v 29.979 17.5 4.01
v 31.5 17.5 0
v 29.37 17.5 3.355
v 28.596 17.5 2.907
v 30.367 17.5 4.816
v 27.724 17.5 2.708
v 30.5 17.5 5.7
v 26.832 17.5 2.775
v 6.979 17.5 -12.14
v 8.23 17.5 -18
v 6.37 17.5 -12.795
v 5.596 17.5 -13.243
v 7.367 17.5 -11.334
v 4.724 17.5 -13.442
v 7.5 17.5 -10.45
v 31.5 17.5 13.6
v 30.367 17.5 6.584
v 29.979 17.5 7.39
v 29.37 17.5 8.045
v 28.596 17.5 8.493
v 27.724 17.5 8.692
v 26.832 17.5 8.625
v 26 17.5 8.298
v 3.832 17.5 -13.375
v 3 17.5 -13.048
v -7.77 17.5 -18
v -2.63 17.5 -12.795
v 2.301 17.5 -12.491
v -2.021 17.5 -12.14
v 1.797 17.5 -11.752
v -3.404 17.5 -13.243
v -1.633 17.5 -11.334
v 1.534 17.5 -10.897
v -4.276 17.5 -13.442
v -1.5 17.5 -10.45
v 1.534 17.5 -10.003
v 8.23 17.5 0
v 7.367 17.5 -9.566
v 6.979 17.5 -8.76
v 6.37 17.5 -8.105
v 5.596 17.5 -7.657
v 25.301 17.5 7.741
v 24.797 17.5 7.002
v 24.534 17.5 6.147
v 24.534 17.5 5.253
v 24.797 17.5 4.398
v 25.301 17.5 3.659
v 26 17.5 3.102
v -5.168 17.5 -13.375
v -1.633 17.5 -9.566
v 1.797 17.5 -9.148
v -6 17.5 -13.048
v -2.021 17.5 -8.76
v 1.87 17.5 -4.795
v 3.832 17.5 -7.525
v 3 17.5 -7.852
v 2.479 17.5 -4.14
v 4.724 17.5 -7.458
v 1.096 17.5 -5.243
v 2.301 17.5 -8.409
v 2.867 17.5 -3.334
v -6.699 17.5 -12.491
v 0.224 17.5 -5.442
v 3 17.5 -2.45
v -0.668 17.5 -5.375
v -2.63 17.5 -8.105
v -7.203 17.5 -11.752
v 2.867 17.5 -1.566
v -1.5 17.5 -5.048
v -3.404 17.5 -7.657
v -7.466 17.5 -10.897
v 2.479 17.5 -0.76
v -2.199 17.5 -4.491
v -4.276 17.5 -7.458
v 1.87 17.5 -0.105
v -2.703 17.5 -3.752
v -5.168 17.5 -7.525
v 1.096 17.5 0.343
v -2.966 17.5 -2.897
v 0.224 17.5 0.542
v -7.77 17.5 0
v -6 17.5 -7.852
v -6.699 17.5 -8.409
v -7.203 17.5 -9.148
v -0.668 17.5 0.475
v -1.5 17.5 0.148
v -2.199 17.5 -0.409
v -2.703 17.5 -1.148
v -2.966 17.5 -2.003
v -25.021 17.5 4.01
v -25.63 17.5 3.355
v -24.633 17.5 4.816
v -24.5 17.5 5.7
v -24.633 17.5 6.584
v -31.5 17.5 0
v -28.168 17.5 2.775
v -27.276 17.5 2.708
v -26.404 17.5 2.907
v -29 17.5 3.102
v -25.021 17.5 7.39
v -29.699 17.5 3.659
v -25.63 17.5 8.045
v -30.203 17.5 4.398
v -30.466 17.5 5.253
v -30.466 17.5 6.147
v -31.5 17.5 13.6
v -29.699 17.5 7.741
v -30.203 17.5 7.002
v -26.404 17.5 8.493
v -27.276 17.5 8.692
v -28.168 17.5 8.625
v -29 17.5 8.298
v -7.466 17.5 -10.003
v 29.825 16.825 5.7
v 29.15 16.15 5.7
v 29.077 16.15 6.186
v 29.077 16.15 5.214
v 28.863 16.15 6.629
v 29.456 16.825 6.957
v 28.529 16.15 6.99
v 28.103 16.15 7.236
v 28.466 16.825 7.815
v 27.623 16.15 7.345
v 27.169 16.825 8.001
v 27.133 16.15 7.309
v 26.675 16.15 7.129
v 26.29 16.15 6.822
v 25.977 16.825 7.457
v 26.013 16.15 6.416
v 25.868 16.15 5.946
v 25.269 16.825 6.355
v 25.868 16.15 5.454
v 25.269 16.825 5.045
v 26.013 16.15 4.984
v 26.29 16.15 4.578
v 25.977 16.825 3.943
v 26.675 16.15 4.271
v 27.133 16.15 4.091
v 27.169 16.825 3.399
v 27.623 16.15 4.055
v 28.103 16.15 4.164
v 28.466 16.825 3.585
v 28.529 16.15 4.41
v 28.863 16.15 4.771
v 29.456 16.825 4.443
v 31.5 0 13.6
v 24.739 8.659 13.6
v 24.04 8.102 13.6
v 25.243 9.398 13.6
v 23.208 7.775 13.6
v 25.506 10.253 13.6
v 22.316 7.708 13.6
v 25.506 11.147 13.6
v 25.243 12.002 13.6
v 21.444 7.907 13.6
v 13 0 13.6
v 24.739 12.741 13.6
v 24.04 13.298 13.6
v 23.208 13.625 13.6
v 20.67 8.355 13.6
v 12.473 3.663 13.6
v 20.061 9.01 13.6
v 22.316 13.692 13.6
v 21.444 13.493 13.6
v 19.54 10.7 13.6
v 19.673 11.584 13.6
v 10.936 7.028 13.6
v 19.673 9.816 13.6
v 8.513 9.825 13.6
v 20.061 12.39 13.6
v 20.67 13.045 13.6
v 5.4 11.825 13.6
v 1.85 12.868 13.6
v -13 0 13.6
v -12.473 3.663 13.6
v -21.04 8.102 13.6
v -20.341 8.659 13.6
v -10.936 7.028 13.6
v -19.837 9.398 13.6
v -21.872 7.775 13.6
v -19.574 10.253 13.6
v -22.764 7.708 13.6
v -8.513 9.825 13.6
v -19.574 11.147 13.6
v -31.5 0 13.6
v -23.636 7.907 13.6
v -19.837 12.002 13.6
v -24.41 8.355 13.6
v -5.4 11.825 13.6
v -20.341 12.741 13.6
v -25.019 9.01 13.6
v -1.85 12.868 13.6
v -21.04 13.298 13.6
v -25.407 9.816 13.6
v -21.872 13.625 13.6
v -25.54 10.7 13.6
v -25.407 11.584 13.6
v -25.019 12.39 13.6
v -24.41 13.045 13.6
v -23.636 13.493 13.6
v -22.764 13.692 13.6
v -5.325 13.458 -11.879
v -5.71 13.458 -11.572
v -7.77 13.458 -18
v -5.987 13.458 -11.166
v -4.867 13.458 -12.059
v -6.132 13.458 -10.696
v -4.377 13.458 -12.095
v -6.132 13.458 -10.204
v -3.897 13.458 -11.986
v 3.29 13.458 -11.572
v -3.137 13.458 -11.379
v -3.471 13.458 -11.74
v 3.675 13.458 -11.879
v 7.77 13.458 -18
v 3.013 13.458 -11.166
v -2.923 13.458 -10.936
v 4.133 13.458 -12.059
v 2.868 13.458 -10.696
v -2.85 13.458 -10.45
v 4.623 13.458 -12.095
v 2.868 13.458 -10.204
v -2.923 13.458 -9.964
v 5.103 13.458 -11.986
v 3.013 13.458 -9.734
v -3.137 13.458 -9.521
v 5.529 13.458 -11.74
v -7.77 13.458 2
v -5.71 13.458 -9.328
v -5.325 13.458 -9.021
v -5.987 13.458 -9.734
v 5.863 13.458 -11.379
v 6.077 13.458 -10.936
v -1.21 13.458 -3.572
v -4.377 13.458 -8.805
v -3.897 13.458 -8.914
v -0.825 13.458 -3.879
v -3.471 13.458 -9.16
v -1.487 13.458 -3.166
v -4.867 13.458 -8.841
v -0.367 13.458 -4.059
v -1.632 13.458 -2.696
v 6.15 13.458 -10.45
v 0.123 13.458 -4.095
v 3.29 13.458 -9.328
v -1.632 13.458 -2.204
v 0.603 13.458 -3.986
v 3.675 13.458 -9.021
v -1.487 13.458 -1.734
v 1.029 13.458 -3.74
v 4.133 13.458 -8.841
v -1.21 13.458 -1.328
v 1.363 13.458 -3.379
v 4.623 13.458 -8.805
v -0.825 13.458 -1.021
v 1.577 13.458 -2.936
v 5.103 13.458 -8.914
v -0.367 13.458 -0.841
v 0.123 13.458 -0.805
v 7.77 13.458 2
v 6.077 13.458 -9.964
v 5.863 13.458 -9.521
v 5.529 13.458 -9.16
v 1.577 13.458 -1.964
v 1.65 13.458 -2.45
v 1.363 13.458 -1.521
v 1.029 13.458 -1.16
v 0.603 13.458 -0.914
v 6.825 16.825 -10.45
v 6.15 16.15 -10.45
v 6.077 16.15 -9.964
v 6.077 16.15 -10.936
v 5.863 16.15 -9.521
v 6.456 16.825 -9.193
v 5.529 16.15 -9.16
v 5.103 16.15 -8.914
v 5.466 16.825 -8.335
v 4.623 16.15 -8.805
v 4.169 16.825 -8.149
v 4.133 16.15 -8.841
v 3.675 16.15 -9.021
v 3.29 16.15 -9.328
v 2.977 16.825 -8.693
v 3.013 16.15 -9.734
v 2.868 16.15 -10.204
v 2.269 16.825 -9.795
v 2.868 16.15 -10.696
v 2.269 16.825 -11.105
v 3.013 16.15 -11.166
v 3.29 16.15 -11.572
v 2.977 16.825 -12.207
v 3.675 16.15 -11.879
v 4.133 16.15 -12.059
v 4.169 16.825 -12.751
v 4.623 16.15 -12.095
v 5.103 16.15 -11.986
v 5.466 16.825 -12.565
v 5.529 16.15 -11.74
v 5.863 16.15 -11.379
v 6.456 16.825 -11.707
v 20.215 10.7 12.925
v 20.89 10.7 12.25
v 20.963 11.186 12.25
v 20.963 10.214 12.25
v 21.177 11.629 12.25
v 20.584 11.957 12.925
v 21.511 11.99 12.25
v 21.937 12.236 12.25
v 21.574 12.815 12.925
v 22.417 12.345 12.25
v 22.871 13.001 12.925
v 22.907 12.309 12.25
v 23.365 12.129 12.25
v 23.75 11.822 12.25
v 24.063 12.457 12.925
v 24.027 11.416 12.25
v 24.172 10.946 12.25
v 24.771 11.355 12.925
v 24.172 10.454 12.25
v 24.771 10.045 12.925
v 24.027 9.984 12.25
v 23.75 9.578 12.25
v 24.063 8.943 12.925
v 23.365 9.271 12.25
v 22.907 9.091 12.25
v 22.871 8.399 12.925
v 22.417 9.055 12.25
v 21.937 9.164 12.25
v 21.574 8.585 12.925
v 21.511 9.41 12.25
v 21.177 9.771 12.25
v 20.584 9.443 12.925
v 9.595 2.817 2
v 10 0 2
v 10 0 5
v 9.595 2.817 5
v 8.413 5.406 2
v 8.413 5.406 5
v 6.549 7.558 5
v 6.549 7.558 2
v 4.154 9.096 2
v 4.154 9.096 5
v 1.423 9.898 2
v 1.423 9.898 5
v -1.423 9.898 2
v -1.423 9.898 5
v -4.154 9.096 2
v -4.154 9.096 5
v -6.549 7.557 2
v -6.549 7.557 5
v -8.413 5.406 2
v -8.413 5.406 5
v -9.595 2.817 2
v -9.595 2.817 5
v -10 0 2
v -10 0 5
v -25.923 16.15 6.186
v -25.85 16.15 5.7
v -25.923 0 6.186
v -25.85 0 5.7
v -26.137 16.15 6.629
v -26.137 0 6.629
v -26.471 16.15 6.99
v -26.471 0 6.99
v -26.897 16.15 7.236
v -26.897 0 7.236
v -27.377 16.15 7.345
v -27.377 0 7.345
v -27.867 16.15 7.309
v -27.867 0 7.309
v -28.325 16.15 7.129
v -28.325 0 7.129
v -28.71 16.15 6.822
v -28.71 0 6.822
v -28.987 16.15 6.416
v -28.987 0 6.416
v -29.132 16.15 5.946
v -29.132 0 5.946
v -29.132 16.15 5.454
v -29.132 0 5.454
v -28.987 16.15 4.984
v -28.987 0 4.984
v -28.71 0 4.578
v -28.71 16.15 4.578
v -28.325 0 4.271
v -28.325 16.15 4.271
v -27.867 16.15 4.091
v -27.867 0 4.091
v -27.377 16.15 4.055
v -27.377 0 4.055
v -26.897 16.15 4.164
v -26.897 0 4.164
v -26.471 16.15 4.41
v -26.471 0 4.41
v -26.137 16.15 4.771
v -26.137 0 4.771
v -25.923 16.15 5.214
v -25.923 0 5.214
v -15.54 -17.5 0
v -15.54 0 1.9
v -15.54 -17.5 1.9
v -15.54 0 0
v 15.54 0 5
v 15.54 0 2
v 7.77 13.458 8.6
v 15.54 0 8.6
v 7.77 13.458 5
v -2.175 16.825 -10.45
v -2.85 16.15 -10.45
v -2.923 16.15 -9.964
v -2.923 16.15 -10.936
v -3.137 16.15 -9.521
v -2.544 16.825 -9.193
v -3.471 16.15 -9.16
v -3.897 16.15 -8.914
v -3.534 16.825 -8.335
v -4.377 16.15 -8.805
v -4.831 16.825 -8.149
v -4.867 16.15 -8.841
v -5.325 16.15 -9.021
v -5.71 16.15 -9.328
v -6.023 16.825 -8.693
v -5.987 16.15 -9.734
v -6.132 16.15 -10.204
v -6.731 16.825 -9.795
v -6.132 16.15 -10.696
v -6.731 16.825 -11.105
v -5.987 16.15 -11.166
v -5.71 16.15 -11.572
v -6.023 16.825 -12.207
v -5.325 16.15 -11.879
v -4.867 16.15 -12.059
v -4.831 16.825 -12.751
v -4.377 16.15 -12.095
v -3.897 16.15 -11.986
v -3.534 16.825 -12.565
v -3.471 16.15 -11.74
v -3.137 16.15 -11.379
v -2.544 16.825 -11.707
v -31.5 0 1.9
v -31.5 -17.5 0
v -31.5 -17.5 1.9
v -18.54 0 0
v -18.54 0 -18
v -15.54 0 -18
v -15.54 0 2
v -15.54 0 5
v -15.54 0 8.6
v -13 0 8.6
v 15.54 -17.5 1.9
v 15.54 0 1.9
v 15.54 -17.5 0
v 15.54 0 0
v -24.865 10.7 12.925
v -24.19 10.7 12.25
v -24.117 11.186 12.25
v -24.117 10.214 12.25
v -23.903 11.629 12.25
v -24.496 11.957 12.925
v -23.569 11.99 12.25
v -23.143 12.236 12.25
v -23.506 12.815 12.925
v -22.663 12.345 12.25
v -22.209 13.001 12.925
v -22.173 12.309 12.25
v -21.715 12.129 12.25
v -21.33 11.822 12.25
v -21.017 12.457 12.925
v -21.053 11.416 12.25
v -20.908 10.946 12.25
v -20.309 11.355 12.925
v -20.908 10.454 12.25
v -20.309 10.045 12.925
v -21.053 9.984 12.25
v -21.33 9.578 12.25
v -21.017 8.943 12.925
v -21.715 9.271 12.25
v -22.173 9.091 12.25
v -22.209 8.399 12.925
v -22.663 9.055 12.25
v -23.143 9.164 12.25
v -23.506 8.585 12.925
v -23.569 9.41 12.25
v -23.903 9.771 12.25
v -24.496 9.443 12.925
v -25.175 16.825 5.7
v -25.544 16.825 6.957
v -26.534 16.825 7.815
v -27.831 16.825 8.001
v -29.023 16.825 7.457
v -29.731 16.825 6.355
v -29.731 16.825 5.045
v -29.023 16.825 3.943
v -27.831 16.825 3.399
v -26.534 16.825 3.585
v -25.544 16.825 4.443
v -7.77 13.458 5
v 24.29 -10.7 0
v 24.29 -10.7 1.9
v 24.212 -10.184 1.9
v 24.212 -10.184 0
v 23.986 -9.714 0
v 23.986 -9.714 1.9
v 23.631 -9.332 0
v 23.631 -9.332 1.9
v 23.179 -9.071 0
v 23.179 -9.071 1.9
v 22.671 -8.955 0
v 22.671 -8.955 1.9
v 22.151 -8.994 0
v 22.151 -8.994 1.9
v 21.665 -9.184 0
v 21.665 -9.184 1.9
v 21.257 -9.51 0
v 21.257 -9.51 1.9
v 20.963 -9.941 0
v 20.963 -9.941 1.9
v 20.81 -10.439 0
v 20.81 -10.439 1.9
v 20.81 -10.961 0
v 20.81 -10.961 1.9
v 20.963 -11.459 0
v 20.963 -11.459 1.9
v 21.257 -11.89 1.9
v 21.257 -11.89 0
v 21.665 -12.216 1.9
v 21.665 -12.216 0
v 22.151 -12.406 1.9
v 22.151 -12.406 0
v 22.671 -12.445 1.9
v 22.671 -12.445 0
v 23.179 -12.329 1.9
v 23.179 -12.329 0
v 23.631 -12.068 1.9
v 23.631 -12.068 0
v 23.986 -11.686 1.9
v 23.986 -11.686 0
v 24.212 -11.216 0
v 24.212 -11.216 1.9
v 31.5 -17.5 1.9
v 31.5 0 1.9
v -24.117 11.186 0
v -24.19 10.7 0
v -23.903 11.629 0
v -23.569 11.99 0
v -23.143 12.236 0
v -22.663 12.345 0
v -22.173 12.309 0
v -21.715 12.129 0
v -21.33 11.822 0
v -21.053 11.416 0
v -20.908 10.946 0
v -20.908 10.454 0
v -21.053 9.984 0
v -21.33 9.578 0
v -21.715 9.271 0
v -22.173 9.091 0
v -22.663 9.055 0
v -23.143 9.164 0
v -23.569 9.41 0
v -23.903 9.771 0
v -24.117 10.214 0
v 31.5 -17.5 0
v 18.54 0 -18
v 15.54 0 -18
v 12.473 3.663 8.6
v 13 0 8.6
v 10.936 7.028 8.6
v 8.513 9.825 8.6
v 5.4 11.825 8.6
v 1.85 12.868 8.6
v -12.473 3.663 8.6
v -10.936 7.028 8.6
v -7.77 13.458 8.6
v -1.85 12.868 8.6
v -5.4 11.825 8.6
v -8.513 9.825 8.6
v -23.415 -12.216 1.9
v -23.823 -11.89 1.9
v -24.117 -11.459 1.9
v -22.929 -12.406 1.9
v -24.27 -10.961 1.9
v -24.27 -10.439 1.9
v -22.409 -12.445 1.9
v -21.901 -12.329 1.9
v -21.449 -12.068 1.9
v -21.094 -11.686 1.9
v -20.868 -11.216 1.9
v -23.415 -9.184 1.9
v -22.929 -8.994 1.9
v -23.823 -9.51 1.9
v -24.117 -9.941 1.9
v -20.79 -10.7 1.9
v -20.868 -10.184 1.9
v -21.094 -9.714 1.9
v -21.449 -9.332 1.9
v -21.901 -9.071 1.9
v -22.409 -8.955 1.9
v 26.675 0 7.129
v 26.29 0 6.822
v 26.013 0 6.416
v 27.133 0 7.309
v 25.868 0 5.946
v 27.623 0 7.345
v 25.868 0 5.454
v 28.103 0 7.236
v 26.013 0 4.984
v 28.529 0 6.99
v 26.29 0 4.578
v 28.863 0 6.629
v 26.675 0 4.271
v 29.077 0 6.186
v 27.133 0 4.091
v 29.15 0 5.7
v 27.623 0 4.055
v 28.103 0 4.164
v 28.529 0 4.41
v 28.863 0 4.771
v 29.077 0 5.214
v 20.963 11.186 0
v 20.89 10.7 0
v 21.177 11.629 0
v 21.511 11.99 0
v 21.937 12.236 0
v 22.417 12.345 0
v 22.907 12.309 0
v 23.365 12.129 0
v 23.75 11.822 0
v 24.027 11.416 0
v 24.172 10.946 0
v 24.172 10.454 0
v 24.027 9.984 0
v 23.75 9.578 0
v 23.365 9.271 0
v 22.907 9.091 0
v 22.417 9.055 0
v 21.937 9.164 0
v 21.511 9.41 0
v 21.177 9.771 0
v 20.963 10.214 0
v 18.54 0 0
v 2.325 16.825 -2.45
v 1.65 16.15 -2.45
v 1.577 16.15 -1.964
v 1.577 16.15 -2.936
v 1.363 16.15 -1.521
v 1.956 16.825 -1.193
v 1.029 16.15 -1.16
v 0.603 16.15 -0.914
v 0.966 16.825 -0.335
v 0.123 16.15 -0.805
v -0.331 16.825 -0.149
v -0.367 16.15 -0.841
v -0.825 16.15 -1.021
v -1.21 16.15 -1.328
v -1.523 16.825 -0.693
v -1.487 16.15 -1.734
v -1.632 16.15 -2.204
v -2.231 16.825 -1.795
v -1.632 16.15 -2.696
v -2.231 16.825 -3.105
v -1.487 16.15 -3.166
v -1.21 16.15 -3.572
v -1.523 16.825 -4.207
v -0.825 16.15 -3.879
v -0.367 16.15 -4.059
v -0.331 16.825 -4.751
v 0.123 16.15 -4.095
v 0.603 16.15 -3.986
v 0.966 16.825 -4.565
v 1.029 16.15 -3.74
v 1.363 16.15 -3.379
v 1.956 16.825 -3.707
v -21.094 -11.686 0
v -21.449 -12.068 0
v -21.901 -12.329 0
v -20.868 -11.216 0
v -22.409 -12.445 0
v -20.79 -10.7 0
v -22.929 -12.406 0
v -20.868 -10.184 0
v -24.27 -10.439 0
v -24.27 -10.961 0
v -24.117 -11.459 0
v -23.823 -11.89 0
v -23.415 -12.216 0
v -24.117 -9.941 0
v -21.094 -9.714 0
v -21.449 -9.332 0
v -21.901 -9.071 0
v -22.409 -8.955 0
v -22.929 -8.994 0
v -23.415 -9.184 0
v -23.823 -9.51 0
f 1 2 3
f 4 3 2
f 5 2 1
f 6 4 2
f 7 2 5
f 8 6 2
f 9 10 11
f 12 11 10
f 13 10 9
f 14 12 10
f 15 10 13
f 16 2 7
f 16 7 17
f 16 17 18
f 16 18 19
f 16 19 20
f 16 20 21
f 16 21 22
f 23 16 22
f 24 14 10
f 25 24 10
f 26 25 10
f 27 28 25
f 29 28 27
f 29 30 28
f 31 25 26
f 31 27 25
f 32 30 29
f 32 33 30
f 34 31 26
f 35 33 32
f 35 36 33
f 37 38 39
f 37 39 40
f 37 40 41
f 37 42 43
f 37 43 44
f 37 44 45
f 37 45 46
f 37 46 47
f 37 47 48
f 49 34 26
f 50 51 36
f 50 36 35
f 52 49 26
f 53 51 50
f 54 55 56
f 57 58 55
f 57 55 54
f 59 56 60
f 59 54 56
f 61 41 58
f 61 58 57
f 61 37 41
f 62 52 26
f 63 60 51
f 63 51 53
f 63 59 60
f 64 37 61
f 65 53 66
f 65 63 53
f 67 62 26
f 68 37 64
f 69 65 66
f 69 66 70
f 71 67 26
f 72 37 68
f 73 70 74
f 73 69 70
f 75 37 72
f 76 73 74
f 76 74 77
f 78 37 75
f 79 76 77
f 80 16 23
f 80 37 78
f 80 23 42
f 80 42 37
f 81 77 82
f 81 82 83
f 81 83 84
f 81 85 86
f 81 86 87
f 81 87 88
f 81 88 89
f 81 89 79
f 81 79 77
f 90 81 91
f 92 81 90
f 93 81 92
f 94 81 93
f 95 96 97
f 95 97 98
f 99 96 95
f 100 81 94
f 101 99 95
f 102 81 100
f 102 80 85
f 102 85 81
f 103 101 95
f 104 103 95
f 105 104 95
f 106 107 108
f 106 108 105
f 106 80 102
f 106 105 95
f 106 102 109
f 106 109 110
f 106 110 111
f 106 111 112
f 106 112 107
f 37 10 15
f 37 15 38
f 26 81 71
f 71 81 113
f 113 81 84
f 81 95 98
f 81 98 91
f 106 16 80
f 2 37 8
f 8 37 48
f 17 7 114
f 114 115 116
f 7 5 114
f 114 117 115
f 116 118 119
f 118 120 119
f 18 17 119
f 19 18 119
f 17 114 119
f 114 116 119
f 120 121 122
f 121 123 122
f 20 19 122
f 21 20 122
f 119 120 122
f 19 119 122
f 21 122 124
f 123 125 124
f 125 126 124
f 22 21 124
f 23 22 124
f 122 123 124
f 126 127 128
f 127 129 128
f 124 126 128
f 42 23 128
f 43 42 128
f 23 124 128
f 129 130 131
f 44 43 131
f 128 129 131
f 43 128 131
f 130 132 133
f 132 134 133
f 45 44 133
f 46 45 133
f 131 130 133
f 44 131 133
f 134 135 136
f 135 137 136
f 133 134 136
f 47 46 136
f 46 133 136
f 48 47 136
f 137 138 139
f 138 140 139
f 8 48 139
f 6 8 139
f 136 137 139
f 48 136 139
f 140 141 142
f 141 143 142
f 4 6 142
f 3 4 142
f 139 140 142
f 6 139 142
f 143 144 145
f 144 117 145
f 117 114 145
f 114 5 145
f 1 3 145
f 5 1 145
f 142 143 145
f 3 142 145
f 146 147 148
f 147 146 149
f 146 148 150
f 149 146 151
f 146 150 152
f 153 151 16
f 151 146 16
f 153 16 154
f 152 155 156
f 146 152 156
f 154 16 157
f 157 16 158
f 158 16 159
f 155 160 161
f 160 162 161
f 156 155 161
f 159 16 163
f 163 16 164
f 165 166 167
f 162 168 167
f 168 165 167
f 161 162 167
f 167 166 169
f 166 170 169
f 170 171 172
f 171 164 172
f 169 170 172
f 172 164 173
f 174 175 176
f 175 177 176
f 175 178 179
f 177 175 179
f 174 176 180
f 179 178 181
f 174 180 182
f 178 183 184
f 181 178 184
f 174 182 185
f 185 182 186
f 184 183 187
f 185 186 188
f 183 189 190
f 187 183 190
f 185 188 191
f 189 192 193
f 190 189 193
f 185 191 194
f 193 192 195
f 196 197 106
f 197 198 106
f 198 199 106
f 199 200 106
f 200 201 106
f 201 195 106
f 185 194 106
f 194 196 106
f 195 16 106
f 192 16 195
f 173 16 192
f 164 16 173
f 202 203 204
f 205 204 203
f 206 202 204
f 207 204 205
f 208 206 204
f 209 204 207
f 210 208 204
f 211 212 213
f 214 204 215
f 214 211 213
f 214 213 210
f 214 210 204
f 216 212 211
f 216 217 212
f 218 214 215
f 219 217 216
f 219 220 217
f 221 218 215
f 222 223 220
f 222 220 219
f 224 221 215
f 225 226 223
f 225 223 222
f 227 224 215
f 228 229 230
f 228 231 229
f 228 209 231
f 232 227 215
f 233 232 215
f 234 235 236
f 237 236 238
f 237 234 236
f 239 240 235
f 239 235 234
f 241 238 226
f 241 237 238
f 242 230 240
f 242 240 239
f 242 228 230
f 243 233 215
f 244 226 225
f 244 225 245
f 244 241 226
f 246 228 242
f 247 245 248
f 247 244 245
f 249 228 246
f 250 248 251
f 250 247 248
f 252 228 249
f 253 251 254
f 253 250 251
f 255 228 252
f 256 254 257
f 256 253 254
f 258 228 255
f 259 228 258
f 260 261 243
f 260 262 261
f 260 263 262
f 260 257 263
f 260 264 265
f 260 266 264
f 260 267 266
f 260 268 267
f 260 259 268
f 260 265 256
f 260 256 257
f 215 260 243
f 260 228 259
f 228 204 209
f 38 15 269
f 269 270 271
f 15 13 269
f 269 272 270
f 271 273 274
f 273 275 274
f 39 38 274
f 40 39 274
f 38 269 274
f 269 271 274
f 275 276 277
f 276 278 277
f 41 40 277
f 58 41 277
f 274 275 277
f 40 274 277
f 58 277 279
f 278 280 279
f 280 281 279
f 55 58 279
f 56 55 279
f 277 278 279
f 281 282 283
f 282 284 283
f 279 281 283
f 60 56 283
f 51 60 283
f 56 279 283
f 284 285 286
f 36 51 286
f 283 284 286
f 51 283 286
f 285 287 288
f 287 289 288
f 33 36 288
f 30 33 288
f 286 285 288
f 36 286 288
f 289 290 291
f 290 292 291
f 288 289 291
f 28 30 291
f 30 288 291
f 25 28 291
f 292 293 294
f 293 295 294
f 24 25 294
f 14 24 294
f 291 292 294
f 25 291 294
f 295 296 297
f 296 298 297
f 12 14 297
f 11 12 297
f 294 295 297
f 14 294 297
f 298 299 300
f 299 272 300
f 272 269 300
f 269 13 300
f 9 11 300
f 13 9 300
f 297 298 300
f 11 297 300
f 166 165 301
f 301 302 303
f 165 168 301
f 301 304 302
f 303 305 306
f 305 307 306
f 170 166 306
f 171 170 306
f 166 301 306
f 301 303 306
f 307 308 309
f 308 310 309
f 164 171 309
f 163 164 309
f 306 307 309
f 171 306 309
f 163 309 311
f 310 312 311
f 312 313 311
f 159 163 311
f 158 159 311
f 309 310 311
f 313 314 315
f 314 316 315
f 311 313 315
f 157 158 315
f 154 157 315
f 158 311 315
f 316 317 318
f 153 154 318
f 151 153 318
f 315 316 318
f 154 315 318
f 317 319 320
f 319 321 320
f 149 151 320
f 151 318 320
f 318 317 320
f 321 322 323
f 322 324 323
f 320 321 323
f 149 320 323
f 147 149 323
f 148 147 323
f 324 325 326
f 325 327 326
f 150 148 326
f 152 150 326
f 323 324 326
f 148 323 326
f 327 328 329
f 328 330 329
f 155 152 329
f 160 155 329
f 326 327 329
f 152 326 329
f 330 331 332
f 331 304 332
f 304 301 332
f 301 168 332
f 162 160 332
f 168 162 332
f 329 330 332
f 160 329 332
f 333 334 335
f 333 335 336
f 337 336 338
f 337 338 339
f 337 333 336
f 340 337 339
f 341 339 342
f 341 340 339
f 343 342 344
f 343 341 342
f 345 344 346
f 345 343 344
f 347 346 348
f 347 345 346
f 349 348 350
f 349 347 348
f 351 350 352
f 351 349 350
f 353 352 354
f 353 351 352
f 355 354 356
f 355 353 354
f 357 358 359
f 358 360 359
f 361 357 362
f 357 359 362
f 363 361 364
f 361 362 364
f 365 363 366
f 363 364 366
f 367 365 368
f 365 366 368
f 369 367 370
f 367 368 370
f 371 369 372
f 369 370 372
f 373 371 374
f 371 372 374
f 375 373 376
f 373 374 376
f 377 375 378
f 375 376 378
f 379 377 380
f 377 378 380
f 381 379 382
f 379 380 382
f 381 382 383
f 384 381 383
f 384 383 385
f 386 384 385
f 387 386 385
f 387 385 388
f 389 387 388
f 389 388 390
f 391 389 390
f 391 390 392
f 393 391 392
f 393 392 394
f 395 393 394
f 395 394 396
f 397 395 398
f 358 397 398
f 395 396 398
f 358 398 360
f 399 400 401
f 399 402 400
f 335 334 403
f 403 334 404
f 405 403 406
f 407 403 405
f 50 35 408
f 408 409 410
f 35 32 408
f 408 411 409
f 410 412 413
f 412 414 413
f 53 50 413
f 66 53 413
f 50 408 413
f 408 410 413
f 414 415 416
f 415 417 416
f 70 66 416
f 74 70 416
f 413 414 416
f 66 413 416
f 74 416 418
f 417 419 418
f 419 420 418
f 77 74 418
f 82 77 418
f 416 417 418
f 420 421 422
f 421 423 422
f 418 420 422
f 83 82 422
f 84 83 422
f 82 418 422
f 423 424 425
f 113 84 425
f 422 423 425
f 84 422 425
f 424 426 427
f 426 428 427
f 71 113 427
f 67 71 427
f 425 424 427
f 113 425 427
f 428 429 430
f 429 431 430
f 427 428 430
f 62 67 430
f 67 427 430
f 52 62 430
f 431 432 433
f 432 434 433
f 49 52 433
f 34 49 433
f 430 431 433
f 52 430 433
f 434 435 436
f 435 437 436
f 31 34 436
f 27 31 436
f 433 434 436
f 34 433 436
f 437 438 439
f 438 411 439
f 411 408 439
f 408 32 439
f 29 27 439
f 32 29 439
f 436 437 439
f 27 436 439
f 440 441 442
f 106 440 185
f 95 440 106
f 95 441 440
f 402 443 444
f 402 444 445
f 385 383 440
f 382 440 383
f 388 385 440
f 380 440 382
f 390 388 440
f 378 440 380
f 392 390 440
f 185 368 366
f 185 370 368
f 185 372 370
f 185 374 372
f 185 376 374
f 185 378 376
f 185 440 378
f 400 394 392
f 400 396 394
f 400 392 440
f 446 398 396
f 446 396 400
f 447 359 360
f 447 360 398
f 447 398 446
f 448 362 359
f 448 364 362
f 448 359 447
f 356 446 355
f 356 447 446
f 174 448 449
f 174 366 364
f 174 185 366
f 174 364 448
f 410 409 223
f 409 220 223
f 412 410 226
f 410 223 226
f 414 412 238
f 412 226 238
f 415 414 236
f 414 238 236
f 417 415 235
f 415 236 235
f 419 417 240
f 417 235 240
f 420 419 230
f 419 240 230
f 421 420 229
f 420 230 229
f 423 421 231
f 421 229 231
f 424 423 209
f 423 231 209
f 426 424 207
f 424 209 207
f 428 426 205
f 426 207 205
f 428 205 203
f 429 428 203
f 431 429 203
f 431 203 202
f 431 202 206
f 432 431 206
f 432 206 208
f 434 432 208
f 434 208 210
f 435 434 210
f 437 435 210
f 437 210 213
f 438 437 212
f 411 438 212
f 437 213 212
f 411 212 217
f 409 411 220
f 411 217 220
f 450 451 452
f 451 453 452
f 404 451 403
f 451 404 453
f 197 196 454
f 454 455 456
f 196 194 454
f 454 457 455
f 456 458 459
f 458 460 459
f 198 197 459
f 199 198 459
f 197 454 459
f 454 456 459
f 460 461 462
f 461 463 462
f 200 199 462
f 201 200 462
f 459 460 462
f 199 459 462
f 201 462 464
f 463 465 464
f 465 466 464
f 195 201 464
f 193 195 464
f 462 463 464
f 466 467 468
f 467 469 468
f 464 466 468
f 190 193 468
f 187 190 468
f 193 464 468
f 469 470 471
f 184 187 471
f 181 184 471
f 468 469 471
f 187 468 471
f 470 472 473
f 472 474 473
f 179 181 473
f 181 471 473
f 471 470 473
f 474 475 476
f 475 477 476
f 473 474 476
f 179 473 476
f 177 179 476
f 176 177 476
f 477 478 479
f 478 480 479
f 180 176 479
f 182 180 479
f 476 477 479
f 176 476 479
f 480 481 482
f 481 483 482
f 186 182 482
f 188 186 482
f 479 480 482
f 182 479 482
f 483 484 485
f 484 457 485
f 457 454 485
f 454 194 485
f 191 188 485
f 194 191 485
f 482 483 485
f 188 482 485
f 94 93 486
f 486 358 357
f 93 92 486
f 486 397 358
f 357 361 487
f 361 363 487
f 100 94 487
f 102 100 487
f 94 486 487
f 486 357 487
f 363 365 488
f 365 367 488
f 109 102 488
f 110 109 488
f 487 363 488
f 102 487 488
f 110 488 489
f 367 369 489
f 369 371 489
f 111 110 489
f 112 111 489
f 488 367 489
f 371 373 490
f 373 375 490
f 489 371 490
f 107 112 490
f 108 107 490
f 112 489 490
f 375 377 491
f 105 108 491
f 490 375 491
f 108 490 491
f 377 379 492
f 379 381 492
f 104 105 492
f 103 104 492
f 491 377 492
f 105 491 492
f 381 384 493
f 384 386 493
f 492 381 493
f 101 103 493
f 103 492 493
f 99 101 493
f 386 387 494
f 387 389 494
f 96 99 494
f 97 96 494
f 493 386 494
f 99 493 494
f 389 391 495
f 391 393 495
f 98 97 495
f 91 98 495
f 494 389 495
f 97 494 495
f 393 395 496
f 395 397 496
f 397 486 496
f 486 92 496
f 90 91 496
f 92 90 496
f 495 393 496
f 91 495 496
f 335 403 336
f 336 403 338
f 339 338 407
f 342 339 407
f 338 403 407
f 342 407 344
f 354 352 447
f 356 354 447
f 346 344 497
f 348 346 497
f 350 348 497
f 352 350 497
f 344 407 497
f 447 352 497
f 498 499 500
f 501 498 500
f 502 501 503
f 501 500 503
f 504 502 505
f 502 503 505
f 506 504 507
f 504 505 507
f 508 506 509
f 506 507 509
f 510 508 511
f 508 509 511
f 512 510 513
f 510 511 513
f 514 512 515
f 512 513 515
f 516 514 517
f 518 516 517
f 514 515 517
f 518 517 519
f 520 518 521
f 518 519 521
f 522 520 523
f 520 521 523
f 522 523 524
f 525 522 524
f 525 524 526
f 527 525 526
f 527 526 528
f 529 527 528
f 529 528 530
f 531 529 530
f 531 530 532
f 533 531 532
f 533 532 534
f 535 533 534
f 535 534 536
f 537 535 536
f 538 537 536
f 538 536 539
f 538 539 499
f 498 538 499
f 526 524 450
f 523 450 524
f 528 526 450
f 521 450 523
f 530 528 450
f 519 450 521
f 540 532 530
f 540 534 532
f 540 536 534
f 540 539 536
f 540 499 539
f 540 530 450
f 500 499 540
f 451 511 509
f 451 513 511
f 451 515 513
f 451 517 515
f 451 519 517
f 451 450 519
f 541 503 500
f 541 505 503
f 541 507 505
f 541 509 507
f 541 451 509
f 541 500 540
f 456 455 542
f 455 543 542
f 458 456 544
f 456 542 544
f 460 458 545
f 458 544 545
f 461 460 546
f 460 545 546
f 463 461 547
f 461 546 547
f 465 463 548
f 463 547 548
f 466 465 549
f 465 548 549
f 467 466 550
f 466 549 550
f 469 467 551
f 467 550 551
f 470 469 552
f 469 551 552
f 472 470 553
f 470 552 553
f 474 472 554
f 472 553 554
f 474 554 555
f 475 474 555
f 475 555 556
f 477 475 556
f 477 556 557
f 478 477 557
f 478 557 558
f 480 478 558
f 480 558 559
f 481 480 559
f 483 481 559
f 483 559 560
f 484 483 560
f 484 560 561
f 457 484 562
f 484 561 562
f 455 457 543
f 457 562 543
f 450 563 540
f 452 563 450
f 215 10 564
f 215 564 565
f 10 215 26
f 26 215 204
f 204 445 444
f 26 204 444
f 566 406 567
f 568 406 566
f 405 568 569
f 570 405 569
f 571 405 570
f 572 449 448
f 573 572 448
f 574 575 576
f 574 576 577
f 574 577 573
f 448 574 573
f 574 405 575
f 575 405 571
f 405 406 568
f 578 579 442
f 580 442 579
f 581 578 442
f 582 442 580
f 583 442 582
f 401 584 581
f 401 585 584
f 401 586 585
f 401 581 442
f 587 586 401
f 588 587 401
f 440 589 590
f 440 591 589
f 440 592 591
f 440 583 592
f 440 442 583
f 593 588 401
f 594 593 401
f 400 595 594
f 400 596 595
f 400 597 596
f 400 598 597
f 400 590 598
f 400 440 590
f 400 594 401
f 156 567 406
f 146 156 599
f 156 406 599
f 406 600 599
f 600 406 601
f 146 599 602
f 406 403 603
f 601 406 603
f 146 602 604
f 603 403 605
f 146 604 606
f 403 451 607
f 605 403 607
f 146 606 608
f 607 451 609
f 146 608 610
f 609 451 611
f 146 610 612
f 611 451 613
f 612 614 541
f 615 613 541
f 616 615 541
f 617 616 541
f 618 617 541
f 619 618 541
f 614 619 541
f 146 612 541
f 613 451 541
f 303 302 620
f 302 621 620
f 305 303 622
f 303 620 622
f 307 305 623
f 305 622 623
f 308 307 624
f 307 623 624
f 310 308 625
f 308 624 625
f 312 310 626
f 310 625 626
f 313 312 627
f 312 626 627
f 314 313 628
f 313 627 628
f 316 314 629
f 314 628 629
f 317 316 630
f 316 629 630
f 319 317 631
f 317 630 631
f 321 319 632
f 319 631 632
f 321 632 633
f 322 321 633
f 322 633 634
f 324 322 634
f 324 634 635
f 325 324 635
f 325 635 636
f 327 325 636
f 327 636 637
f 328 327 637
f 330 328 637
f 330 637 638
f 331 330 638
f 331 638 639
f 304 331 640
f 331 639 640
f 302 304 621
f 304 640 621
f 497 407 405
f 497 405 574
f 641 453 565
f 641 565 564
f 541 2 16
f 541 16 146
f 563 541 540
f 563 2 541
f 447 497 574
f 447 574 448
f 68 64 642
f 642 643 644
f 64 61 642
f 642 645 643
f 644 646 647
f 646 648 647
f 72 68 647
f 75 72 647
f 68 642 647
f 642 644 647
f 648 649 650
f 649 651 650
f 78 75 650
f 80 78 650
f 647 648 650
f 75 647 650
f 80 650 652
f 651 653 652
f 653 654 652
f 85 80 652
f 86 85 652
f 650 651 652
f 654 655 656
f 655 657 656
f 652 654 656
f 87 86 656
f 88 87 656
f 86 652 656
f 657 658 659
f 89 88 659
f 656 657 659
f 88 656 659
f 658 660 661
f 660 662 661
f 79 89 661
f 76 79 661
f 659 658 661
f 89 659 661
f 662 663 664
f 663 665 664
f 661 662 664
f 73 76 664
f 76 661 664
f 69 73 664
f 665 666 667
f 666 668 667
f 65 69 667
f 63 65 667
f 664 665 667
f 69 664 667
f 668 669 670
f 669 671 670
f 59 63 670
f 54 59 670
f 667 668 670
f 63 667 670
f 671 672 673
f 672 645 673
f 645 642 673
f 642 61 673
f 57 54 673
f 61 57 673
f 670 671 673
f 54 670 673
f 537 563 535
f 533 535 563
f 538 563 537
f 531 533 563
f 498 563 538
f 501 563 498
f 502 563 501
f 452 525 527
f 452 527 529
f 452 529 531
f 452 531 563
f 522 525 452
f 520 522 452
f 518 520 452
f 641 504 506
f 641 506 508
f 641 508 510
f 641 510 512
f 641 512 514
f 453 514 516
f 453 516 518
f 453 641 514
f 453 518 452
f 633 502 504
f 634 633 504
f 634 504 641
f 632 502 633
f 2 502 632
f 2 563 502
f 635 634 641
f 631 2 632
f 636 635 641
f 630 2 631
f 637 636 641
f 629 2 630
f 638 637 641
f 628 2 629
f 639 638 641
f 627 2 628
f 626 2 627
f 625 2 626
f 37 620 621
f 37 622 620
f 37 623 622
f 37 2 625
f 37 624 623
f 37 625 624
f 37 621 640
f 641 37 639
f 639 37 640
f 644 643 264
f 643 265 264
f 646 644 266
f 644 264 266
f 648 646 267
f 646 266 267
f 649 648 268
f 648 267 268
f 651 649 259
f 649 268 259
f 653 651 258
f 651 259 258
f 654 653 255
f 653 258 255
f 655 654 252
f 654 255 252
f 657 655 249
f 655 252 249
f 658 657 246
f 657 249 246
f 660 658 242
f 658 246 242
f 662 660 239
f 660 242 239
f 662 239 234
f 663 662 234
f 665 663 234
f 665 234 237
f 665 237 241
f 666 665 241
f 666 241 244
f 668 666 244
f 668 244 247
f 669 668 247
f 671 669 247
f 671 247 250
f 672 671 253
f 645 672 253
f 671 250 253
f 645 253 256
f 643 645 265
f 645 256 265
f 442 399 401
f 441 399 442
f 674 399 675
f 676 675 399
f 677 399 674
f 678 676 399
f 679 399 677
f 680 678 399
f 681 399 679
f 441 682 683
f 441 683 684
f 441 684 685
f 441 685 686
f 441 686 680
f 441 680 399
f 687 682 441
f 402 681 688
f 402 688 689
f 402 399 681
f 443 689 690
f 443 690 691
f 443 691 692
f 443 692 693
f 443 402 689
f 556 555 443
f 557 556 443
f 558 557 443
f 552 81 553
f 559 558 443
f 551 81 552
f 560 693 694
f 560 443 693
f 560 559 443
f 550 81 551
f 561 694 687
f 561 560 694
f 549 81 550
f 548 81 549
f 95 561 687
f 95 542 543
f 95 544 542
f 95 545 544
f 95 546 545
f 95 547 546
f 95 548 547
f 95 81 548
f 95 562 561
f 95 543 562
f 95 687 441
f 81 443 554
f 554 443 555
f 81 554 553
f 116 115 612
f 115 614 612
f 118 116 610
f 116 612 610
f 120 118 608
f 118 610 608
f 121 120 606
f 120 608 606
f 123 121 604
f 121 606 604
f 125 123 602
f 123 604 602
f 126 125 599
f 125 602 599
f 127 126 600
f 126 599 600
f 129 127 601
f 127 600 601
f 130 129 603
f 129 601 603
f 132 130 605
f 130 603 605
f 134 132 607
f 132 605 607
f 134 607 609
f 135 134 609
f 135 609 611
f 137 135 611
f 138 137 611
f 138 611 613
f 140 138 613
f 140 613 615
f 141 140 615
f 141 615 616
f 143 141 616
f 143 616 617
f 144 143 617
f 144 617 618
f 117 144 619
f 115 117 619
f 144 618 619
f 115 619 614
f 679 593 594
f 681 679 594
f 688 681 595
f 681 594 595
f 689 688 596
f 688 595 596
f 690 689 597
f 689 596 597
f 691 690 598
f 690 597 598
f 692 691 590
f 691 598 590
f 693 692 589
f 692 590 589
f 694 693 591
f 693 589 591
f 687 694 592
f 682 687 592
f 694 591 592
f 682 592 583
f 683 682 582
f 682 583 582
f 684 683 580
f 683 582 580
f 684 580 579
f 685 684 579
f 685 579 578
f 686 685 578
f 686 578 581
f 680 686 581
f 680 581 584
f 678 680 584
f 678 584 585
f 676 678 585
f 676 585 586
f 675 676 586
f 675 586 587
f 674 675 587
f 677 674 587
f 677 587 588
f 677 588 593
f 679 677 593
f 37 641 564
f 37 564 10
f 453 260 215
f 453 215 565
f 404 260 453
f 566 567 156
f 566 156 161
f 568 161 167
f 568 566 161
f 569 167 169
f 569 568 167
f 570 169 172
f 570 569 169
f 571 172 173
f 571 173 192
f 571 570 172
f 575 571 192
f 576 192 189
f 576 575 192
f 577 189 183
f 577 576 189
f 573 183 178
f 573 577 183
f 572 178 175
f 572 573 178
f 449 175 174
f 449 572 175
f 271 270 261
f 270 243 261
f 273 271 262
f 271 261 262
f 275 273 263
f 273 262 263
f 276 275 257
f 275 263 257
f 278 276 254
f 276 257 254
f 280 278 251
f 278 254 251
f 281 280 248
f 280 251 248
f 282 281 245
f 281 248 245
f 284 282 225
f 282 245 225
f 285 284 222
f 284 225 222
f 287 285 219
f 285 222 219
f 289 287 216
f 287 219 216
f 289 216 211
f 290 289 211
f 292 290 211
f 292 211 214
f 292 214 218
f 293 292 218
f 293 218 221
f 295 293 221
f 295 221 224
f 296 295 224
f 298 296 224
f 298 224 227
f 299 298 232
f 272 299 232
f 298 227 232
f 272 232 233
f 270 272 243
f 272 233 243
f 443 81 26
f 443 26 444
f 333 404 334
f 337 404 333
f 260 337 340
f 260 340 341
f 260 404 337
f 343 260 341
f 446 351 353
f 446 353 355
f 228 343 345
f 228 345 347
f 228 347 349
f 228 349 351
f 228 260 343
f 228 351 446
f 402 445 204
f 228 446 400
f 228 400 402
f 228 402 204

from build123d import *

# Parameters (mm, degrees)
PAD_DEPTH           = 2
PAD001_DEPTH        = 3
PAD002_DEPTH        = 3.6
PAD003_DEPTH        = 5
SKETCH004_W         = 63
SKETCH004_H         = 17.5
POCKET_DEPTH        = 11.7
PAD004_DEPTH        = 18
HOLE_D              = 3.3
HOLE_DEPTH          = 24.00858
HOLE_CSINK_D        = 6
HOLE_CSINK_ANGLE    = 90
HOLE_TIPS_R         = 1.65
SKETCH010_R         = 1.75
POCKET001_DEPTH     = 5
HOLE001_D           = 3.3
HOLE001_DEPTH       = 24.00858
HOLE001_CSINK_D     = 6
HOLE001_CSINK_ANGLE = 90
HOLE001_TIPS_R      = 1.65
HOLE002_D           = 3.3
HOLE002_DEPTH       = 24.00858
HOLE002_CSINK_D     = 6
HOLE002_CSINK_ANGLE = 90
HOLE002_TIPS_R      = 1.65


with BuildPart() as part:
    # Sketch → Pad (new body)
    with BuildSketch(Plane.XY):
        Polygon((-31.5, 17.5), (31.5, 17.5), (31.5, -17.5), (15.54, -17.5), (15.54, 2.8e-05), (7.77, 13.458035), (-7.77, 13.458035), (-15.54, 0), (-15.54, -17.5), (-31.5, -17.5), align=None)
    extrude(amount=PAD_DEPTH)

    # Sketch001 (on Face12 of Pad) → Pad001 (join)
    with BuildSketch(Plane.XY.offset(2)):
        with BuildLine():
            ThreePointArc((10, 2.8e-05), (-1.4e-05, 10), (-10, 0))
            Line((-15.54, 0), (-10, 0))
            Line((-15.54, -17.5), (-15.54, 0))
            Line((-15.54, -17.5), (-31.5, -17.5))
            Line((-31.5, -17.5), (-31.5, 17.5))
            Line((-31.5, 17.5), (31.5, 17.5))
            Line((31.5, 17.5), (31.5, -17.5))
            Line((31.5, -17.5), (15.54, -17.5))
            Line((15.54, -17.5), (15.54, 2.8e-05))
            Line((10, 2.8e-05), (15.54, 2.8e-05))
        make_face()
    extrude(amount=PAD001_DEPTH)

    # Sketch002 (on Face20 of Pad001) → Pad002 (join)
    with BuildSketch(Plane.XY.offset(5)):
        Polygon((15.54, 0), (7.77, 13.458035), (-7.77, 13.458035), (-15.54, 0), (-15.54, -17.5), (-31.5, -17.5), (-31.5, 17.5), (31.5, 17.5), (31.5, -17.5), (15.54, -17.5), align=None)
    extrude(amount=PAD002_DEPTH)

    # Sketch003 (on Face31 of Pad002) → Pad003 (join)
    with BuildSketch(Plane.XY.offset(8.6)):
        with BuildLine():
            Line((-31.5, 17.5), (31.5, 17.5))
            Line((31.5, 17.5), (31.5, -17.5))
            Line((31.5, -17.5), (15.54, -17.5))
            Line((15.54, 0), (15.54, -17.5))
            Line((13, 0), (15.54, 0))
            ThreePointArc((13, 0), (0, 13), (-13, 0))
            Line((-15.54, 0), (-13, 0))
            Line((-15.54, 0), (-15.54, -17.5))
            Line((-15.54, -17.5), (-31.5, -17.5))
            Line((-31.5, -17.5), (-31.5, 17.5))
        make_face()
    extrude(amount=PAD003_DEPTH)

    # Sketch004 (on Face41 of Pad003) → Pocket (cut)
    with BuildSketch(Plane.XY.offset(13.6)):
        with Locations((0, -8.75)):
            Rectangle(SKETCH004_W, SKETCH004_H)
    extrude(amount=-POCKET_DEPTH, mode=Mode.SUBTRACT)

    # Sketch008 (on Face1 of Pocket) → Pad004 (join)
    with BuildSketch(Plane(origin=(0, 0, 0), x_dir=(1, 0, 0), z_dir=(0, 0, -1))):
        Polygon((-7.77, -13.458035), (7.77, -13.458035), (15.54, -2.8e-05), (18.54, 0), (8.23, -17.5), (-7.77, -17.5), (-18.54, 0), (-15.54, 0), align=None)
    extrude(amount=PAD004_DEPTH)

    # Hole
    with Locations(Plane(origin=(0, 17.5, 0), x_dir=(-1, 0, 0), z_dir=(0, 1, 0))):
        with Locations((0, -2.45), (-4.5, -10.45), (4.5, -10.45)):
            CounterSinkHole(HOLE_D / 2, HOLE_CSINK_D / 2, depth=HOLE_DEPTH, counter_sink_angle=HOLE_CSINK_ANGLE)

    # Hole tips → Hole tip 1 section 0
    with BuildSketch(Plane(origin=(0, -6.50858, 0), x_dir=(-1, 0, 0), z_dir=(0, 1, 0)), mode=Mode.PRIVATE) as hole_tip_1_s0:
        with Locations((0, -2.45)):
            Circle(HOLE_TIPS_R)
    loft([hole_tip_1_s0.sketch, Vertex(0, -7.5, -2.45)], mode=Mode.SUBTRACT)

    # Hole tips → Hole tip 2 section 0
    with BuildSketch(Plane(origin=(0, -6.50858, 0), x_dir=(-1, 0, 0), z_dir=(0, 1, 0)), mode=Mode.PRIVATE) as hole_tip_2_s0:
        with Locations((-4.5, -10.45)):
            Circle(HOLE_TIPS_R)
    loft([hole_tip_2_s0.sketch, Vertex(4.5, -7.5, -10.45)], mode=Mode.SUBTRACT)

    # Hole tips → Hole tip 3 section 0
    with BuildSketch(Plane(origin=(0, -6.50858, 0), x_dir=(-1, 0, 0), z_dir=(0, 1, 0)), mode=Mode.PRIVATE) as hole_tip_3_s0:
        with Locations((4.5, -10.45)):
            Circle(HOLE_TIPS_R)
    loft([hole_tip_3_s0.sketch, Vertex(-4.5, -7.5, -10.45)], mode=Mode.SUBTRACT)

    # Sketch010 (on Face32 of Hole) → Pocket001 (cut)
    with BuildSketch(Plane.XY.offset(1.9)):
        with Locations((-22.54, -10.7)):
            Circle(SKETCH010_R)
        with Locations((22.54, -10.7)):
            Circle(SKETCH010_R)
    extrude(amount=-POCKET001_DEPTH, mode=Mode.SUBTRACT)

    # Hole001
    with Locations(Plane.XY.offset(13.6)):
        with Locations((-22.54, 10.7), (22.54, 10.7)):
            CounterSinkHole(HOLE001_D / 2, HOLE001_CSINK_D / 2, depth=HOLE001_DEPTH, counter_sink_angle=HOLE001_CSINK_ANGLE)

    # Hole001 tips → Hole001 tip 1 section 0
    with BuildSketch(Plane.XY.offset(-10.40858), mode=Mode.PRIVATE) as hole001_tip_1_s0:
        with Locations((-22.54, 10.7)):
            Circle(HOLE001_TIPS_R)
    loft([hole001_tip_1_s0.sketch, Vertex(-22.54, 10.7, -11.4)], mode=Mode.SUBTRACT)

    # Hole001 tips → Hole001 tip 2 section 0
    with BuildSketch(Plane.XY.offset(-10.40858), mode=Mode.PRIVATE) as hole001_tip_2_s0:
        with Locations((22.54, 10.7)):
            Circle(HOLE001_TIPS_R)
    loft([hole001_tip_2_s0.sketch, Vertex(22.54, 10.7, -11.4)], mode=Mode.SUBTRACT)

    # Hole002
    with Locations(Plane(origin=(0, 17.5, 0), x_dir=(-1, 0, 0), z_dir=(0, 1, 0))):
        with Locations((-27.5, 5.7), (27.5, 5.7)):
            CounterSinkHole(HOLE002_D / 2, HOLE002_CSINK_D / 2, depth=HOLE002_DEPTH, counter_sink_angle=HOLE002_CSINK_ANGLE)

    # Hole002 tips → Hole002 tip 1 section 0
    with BuildSketch(Plane(origin=(0, -6.50858, 0), x_dir=(-1, 0, 0), z_dir=(0, 1, 0)), mode=Mode.PRIVATE) as hole002_tip_1_s0:
        with Locations((-27.5, 5.7)):
            Circle(HOLE002_TIPS_R)
    loft([hole002_tip_1_s0.sketch, Vertex(27.5, -7.5, 5.7)], mode=Mode.SUBTRACT)

    # Hole002 tips → Hole002 tip 2 section 0
    with BuildSketch(Plane(origin=(0, -6.50858, 0), x_dir=(-1, 0, 0), z_dir=(0, 1, 0)), mode=Mode.PRIVATE) as hole002_tip_2_s0:
        with Locations((27.5, 5.7)):
            Circle(HOLE002_TIPS_R)
    loft([hole002_tip_2_s0.sketch, Vertex(-27.5, -7.5, 5.7)], mode=Mode.SUBTRACT)


solid = part.part
